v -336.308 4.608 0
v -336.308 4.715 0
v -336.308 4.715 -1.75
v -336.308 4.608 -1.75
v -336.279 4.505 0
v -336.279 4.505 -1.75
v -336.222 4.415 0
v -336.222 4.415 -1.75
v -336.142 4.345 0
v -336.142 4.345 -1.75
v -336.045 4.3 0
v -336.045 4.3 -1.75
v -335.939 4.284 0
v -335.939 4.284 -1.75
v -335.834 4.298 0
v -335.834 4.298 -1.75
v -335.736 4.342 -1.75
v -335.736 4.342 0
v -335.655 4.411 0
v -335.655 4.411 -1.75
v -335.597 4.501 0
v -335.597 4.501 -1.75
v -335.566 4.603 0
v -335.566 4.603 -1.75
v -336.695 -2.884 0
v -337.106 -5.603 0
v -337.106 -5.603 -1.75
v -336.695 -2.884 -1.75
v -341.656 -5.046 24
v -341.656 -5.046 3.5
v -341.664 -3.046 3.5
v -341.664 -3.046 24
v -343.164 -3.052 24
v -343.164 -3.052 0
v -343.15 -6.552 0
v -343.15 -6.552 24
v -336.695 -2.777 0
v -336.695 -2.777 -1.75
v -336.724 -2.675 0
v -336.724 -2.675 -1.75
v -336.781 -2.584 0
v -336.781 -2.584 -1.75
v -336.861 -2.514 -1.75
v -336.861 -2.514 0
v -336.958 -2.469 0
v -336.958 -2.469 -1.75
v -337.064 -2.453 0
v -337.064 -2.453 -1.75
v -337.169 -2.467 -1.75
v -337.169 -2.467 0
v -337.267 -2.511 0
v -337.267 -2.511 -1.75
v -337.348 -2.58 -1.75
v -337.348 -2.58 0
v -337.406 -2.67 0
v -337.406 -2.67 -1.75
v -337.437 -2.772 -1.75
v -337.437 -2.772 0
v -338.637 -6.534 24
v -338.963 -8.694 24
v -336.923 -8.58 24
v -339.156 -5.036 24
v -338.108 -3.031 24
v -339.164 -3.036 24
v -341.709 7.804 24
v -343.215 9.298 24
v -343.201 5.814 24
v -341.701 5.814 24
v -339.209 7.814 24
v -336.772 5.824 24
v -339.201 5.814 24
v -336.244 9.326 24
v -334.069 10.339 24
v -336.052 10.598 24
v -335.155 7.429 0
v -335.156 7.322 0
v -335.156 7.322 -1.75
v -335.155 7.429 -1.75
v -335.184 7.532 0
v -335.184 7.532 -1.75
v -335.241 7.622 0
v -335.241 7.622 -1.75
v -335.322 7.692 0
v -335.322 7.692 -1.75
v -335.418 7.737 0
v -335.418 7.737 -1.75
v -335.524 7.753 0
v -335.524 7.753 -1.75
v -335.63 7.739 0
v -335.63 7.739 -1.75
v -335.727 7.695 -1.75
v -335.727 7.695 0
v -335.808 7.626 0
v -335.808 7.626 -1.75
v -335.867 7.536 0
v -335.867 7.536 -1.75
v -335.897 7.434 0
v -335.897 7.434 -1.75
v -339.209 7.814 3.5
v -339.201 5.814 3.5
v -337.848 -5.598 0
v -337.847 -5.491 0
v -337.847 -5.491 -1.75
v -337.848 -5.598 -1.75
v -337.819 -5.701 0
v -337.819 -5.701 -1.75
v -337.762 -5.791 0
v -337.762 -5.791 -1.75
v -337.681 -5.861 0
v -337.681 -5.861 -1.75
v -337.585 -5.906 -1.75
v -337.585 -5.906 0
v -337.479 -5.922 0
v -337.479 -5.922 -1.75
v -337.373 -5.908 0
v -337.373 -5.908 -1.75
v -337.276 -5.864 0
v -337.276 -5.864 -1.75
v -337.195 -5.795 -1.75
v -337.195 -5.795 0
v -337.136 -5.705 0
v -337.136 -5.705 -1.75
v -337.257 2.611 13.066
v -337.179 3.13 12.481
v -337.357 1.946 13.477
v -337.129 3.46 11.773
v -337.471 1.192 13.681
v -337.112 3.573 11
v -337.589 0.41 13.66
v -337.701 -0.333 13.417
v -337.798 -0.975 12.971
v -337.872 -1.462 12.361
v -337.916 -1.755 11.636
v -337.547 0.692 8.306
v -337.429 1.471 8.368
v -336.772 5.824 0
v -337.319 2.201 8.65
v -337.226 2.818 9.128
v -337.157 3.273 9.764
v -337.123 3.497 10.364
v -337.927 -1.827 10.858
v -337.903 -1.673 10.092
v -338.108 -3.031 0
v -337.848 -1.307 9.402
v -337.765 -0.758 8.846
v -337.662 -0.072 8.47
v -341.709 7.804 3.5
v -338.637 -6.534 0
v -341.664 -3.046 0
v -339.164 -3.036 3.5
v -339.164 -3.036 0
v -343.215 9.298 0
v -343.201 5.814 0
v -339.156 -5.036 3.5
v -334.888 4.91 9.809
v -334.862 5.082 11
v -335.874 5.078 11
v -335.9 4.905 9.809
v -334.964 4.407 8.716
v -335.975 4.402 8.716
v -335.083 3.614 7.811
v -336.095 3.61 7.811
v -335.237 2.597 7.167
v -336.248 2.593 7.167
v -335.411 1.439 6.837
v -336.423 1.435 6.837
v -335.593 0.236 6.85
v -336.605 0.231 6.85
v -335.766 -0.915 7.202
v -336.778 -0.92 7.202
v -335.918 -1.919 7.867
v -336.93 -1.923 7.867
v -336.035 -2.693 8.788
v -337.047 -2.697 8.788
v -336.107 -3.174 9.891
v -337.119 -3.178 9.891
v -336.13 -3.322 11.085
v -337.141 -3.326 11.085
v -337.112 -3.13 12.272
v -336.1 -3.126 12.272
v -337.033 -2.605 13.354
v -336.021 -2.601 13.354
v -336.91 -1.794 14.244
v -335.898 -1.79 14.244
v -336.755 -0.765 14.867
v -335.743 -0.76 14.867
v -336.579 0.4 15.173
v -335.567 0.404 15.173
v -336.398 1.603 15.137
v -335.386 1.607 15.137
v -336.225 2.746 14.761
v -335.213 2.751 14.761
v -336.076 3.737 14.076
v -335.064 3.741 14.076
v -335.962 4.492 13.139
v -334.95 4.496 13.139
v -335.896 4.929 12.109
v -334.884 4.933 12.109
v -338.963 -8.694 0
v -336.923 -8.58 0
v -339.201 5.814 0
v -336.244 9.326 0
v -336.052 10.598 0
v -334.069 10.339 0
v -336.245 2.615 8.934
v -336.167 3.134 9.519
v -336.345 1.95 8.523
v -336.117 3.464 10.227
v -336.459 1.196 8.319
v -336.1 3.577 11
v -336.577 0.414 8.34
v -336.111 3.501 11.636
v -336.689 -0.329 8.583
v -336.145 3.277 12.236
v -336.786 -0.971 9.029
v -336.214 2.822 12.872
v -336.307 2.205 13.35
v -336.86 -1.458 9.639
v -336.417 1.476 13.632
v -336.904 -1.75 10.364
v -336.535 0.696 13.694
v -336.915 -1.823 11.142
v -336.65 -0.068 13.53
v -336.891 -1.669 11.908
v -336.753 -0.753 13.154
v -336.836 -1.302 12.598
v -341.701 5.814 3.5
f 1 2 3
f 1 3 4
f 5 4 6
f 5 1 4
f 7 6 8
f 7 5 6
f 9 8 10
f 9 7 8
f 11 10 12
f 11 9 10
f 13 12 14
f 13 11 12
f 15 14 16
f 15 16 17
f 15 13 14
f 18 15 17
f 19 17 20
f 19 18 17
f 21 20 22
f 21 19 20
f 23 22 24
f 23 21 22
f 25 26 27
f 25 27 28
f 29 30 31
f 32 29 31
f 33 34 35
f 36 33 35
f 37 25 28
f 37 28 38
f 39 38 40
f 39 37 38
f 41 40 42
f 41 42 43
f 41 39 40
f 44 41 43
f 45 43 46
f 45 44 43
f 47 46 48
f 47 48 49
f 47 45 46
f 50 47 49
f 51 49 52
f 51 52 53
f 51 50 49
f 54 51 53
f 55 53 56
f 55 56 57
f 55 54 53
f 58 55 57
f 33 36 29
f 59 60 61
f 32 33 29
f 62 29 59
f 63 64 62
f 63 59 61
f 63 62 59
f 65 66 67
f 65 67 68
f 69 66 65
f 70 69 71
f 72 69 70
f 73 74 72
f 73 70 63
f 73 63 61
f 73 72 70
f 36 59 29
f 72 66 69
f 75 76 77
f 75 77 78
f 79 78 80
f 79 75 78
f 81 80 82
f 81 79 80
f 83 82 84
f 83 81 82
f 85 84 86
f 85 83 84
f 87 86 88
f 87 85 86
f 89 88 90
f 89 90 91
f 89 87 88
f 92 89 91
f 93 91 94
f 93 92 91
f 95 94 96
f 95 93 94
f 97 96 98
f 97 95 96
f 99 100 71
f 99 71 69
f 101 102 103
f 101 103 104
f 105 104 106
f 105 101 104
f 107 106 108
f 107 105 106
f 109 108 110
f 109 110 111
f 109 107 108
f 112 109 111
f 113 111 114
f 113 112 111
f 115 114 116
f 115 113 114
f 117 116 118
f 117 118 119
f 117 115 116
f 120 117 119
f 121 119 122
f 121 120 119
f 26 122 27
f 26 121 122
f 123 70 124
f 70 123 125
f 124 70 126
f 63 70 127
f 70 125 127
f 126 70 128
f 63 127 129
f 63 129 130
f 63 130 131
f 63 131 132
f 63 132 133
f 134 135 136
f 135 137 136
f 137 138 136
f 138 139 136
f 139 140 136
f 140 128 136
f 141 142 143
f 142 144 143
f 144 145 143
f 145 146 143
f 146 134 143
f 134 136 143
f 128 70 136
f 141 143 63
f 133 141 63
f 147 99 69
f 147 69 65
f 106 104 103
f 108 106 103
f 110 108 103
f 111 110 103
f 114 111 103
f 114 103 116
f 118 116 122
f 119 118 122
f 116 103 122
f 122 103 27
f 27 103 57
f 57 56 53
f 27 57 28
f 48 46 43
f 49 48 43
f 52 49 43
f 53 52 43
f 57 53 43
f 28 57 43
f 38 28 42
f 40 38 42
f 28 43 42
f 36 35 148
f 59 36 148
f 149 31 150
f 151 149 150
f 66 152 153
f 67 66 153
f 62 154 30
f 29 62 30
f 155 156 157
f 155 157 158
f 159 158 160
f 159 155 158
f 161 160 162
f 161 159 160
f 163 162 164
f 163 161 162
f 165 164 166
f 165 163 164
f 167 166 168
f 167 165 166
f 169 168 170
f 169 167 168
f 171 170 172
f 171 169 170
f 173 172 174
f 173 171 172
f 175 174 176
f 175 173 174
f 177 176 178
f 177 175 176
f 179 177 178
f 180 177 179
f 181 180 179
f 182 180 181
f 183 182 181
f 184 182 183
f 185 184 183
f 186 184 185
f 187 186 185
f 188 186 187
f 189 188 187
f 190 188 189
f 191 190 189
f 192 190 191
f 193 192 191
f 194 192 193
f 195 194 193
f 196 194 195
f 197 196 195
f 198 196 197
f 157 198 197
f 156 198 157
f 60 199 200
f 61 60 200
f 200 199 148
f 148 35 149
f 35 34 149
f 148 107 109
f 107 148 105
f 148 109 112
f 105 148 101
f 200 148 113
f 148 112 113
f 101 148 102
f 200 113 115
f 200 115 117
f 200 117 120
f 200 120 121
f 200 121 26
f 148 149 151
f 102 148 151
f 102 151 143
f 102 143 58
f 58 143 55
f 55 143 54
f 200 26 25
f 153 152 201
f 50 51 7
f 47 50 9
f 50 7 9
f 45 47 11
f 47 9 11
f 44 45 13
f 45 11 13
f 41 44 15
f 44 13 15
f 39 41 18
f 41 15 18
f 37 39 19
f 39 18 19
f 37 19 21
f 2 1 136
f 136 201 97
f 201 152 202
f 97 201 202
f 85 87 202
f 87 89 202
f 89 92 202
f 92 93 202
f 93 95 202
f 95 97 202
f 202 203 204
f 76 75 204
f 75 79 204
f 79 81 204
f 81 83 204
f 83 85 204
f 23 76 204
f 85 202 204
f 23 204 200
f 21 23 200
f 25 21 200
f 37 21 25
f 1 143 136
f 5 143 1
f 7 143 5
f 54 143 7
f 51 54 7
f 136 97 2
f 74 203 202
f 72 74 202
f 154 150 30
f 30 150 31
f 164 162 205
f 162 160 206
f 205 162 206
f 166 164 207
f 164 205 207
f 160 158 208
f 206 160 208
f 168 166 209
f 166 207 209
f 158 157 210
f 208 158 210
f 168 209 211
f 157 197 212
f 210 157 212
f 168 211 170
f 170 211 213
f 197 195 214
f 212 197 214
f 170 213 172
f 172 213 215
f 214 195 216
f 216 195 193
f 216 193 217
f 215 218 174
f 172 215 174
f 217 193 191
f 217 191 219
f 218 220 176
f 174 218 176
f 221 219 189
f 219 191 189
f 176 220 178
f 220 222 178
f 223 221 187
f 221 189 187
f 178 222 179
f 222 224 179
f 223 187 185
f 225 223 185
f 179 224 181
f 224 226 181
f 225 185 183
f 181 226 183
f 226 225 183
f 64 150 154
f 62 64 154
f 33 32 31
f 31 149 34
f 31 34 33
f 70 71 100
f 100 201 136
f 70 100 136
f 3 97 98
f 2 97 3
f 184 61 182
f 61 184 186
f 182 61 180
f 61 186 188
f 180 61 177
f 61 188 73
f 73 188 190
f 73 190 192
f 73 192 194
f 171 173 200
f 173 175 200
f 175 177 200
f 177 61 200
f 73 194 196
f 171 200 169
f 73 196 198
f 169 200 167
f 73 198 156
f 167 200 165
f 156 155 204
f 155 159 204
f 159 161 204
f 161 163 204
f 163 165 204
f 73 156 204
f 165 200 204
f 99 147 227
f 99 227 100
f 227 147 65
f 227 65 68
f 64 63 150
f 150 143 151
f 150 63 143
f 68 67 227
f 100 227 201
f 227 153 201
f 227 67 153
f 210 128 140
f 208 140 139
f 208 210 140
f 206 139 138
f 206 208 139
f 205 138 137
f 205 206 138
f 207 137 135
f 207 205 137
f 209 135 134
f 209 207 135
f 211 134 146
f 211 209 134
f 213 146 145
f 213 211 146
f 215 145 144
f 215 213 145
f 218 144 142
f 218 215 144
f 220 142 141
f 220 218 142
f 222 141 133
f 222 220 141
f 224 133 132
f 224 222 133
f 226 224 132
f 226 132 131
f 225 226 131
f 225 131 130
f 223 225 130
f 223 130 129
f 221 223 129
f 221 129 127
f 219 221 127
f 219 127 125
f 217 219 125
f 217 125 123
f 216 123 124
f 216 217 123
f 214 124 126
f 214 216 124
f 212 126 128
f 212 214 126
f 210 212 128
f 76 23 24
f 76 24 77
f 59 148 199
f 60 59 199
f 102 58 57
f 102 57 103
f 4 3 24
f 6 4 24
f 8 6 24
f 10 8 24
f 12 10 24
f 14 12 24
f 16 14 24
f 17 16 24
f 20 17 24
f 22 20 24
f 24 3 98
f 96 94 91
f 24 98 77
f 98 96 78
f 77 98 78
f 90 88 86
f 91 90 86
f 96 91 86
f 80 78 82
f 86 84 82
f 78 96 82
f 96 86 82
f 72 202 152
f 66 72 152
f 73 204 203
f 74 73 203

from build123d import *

# Parameters (mm, degrees)
BOSS_EXTRUDE1_DEPTH = 24
BOSS_EXTRUDE2_DEPTH = 1.75
CUT_EXTRUDE1_START  = -20.5
CUT_EXTRUDE1_DEPTH  = 20.5
SKETCH6_R           = 2.7
CUT_EXTRUDE2_DEPTH  = 29.350689779
CUT_EXTRUDE3_REACH  = 30.351
SKETCH7_R           = 4.2


with BuildPart() as part:
    # Sketch1 → Boss-Extrude1 (new body)
    with BuildSketch(Plane.XY):
        Polygon((-343.150061909, -6.552014413), (-338.636620437, -6.533511206), (-338.962584075, -8.694184464), (-336.922787571, -8.580403809), (-334.068528094, 10.339259009), (-336.052092086, 10.598219582), (-336.243956758, 9.326430897), (-343.215039679, 9.297852397), (-343.200758501, 5.814279983), (-341.700745896, 5.814279983), (-341.708902968, 7.804014317), (-339.208923976, 7.814263177), (-339.200724888, 5.814279983), (-336.772305205, 5.82423548), (-338.108271991, -3.031315789), (-339.164443925, -3.035645649), (-339.156244837, -5.035628842), (-341.656223829, -5.045877702), (-341.664422917, -3.045894508), (-343.164410312, -3.052043824), align=None)
        Polygon((-341.708902968, 7.804014317), (-341.700745896, 5.814279983), (-339.200724888, 5.814279983), (-339.208923976, 7.814263177), align=None)
        Polygon((-341.664422917, -3.045894508), (-339.164443925, -3.035645649), (-339.156244837, -5.035628842), (-341.656223829, -5.045877702), align=None)
    extrude(amount=BOSS_EXTRUDE1_DEPTH)

    # Sketch2 → Boss-Extrude2 (add)
    with BuildSketch(Plane(origin=(0, 0, 0), x_dir=(-1, 0, 0), z_dir=(0, 0, -1))):
        with BuildLine():
            Line((335.897375602, 7.434032542), (336.307604283, 4.714802425))
            ThreePointArc((336.307604283, 4.714802425), (335.992740451, 4.288058043), (335.565996069, 4.602921876))
            Line((335.565996069, 4.602921876), (335.155767388, 7.322151993))
            ThreePointArc((335.155767388, 7.322151993), (335.47063122, 7.748896374), (335.897375602, 7.434032542))
        make_face()
        with BuildLine():
            Line((337.437092292, -2.772089521), (337.847320974, -5.491319638))
            ThreePointArc((337.847320974, -5.491319638), (337.532457142, -5.918064019), (337.10571276, -5.603200187))
            Line((337.10571276, -5.603200187), (336.695484079, -2.88397007))
            ThreePointArc((336.695484079, -2.88397007), (337.010347911, -2.457225689), (337.437092292, -2.772089521))
        make_face()
    extrude(amount=BOSS_EXTRUDE2_DEPTH)

    # Sketch3 → Cut-Extrude1 (cut)
    with BuildSketch(Plane.XY.offset(24).offset(CUT_EXTRUDE1_START)):
        Polygon((-339.156244837, -5.035628842), (-341.656223829, -5.045877702), (-341.664422917, -3.045894508), (-339.164443925, -3.035645649), align=None)
        Polygon((-341.708902968, 7.804014317), (-341.700745896, 5.814279983), (-339.200724888, 5.814279983), (-339.208923976, 7.814263177), align=None)
    extrude(amount=CUT_EXTRUDE1_DEPTH, mode=Mode.SUBTRACT)

    # Sketch6 → Cut-Extrude2 (cut, through all)
    with BuildSketch(Plane(origin=(-334.020527762, -1.369343309, 0), x_dir=(0, 0, -1), z_dir=(-0.9999915968347833, -0.00409954385515742, 0))):
        with Locations(Location((-11, -2.254799372, 0), (0, 0, 270))):
            Circle(SKETCH6_R)
    extrude(amount=CUT_EXTRUDE2_DEPTH, mode=Mode.SUBTRACT)

    # Cut-Extrude3: up to this plane
    cut_extrude3_end = Plane(origin=(-329.148436726, 49.656014161, 45.350773476), z_dir=(-0.9888109516181178, 0.14917406597687244, 0))
    # Sketch7 → Cut-Extrude3 (cut, up to the surface)
    with BuildSketch(Plane(origin=(-334.020527762, -1.369343309, 0), x_dir=(0, 0, -1), z_dir=(-0.9999915968347833, -0.00409954385515742, 0)), mode=Mode.PRIVATE) as cut_extrude3_sk1:
        with Locations(Location((-11, -2.254799372, 0), (0, 0, 270))):
            Circle(SKETCH7_R)
    cut_extrude3_tool1 = split(extrude(cut_extrude3_sk1.sketch, amount=CUT_EXTRUDE3_REACH, mode=Mode.PRIVATE), bisect_by=cut_extrude3_end, keep=Keep.BOTH, mode=Mode.PRIVATE)
    add(cut_extrude3_tool1.solids().sort_by_distance((-334.029771, 0.885437, 11))[0], mode=Mode.SUBTRACT)


solid = part.part
